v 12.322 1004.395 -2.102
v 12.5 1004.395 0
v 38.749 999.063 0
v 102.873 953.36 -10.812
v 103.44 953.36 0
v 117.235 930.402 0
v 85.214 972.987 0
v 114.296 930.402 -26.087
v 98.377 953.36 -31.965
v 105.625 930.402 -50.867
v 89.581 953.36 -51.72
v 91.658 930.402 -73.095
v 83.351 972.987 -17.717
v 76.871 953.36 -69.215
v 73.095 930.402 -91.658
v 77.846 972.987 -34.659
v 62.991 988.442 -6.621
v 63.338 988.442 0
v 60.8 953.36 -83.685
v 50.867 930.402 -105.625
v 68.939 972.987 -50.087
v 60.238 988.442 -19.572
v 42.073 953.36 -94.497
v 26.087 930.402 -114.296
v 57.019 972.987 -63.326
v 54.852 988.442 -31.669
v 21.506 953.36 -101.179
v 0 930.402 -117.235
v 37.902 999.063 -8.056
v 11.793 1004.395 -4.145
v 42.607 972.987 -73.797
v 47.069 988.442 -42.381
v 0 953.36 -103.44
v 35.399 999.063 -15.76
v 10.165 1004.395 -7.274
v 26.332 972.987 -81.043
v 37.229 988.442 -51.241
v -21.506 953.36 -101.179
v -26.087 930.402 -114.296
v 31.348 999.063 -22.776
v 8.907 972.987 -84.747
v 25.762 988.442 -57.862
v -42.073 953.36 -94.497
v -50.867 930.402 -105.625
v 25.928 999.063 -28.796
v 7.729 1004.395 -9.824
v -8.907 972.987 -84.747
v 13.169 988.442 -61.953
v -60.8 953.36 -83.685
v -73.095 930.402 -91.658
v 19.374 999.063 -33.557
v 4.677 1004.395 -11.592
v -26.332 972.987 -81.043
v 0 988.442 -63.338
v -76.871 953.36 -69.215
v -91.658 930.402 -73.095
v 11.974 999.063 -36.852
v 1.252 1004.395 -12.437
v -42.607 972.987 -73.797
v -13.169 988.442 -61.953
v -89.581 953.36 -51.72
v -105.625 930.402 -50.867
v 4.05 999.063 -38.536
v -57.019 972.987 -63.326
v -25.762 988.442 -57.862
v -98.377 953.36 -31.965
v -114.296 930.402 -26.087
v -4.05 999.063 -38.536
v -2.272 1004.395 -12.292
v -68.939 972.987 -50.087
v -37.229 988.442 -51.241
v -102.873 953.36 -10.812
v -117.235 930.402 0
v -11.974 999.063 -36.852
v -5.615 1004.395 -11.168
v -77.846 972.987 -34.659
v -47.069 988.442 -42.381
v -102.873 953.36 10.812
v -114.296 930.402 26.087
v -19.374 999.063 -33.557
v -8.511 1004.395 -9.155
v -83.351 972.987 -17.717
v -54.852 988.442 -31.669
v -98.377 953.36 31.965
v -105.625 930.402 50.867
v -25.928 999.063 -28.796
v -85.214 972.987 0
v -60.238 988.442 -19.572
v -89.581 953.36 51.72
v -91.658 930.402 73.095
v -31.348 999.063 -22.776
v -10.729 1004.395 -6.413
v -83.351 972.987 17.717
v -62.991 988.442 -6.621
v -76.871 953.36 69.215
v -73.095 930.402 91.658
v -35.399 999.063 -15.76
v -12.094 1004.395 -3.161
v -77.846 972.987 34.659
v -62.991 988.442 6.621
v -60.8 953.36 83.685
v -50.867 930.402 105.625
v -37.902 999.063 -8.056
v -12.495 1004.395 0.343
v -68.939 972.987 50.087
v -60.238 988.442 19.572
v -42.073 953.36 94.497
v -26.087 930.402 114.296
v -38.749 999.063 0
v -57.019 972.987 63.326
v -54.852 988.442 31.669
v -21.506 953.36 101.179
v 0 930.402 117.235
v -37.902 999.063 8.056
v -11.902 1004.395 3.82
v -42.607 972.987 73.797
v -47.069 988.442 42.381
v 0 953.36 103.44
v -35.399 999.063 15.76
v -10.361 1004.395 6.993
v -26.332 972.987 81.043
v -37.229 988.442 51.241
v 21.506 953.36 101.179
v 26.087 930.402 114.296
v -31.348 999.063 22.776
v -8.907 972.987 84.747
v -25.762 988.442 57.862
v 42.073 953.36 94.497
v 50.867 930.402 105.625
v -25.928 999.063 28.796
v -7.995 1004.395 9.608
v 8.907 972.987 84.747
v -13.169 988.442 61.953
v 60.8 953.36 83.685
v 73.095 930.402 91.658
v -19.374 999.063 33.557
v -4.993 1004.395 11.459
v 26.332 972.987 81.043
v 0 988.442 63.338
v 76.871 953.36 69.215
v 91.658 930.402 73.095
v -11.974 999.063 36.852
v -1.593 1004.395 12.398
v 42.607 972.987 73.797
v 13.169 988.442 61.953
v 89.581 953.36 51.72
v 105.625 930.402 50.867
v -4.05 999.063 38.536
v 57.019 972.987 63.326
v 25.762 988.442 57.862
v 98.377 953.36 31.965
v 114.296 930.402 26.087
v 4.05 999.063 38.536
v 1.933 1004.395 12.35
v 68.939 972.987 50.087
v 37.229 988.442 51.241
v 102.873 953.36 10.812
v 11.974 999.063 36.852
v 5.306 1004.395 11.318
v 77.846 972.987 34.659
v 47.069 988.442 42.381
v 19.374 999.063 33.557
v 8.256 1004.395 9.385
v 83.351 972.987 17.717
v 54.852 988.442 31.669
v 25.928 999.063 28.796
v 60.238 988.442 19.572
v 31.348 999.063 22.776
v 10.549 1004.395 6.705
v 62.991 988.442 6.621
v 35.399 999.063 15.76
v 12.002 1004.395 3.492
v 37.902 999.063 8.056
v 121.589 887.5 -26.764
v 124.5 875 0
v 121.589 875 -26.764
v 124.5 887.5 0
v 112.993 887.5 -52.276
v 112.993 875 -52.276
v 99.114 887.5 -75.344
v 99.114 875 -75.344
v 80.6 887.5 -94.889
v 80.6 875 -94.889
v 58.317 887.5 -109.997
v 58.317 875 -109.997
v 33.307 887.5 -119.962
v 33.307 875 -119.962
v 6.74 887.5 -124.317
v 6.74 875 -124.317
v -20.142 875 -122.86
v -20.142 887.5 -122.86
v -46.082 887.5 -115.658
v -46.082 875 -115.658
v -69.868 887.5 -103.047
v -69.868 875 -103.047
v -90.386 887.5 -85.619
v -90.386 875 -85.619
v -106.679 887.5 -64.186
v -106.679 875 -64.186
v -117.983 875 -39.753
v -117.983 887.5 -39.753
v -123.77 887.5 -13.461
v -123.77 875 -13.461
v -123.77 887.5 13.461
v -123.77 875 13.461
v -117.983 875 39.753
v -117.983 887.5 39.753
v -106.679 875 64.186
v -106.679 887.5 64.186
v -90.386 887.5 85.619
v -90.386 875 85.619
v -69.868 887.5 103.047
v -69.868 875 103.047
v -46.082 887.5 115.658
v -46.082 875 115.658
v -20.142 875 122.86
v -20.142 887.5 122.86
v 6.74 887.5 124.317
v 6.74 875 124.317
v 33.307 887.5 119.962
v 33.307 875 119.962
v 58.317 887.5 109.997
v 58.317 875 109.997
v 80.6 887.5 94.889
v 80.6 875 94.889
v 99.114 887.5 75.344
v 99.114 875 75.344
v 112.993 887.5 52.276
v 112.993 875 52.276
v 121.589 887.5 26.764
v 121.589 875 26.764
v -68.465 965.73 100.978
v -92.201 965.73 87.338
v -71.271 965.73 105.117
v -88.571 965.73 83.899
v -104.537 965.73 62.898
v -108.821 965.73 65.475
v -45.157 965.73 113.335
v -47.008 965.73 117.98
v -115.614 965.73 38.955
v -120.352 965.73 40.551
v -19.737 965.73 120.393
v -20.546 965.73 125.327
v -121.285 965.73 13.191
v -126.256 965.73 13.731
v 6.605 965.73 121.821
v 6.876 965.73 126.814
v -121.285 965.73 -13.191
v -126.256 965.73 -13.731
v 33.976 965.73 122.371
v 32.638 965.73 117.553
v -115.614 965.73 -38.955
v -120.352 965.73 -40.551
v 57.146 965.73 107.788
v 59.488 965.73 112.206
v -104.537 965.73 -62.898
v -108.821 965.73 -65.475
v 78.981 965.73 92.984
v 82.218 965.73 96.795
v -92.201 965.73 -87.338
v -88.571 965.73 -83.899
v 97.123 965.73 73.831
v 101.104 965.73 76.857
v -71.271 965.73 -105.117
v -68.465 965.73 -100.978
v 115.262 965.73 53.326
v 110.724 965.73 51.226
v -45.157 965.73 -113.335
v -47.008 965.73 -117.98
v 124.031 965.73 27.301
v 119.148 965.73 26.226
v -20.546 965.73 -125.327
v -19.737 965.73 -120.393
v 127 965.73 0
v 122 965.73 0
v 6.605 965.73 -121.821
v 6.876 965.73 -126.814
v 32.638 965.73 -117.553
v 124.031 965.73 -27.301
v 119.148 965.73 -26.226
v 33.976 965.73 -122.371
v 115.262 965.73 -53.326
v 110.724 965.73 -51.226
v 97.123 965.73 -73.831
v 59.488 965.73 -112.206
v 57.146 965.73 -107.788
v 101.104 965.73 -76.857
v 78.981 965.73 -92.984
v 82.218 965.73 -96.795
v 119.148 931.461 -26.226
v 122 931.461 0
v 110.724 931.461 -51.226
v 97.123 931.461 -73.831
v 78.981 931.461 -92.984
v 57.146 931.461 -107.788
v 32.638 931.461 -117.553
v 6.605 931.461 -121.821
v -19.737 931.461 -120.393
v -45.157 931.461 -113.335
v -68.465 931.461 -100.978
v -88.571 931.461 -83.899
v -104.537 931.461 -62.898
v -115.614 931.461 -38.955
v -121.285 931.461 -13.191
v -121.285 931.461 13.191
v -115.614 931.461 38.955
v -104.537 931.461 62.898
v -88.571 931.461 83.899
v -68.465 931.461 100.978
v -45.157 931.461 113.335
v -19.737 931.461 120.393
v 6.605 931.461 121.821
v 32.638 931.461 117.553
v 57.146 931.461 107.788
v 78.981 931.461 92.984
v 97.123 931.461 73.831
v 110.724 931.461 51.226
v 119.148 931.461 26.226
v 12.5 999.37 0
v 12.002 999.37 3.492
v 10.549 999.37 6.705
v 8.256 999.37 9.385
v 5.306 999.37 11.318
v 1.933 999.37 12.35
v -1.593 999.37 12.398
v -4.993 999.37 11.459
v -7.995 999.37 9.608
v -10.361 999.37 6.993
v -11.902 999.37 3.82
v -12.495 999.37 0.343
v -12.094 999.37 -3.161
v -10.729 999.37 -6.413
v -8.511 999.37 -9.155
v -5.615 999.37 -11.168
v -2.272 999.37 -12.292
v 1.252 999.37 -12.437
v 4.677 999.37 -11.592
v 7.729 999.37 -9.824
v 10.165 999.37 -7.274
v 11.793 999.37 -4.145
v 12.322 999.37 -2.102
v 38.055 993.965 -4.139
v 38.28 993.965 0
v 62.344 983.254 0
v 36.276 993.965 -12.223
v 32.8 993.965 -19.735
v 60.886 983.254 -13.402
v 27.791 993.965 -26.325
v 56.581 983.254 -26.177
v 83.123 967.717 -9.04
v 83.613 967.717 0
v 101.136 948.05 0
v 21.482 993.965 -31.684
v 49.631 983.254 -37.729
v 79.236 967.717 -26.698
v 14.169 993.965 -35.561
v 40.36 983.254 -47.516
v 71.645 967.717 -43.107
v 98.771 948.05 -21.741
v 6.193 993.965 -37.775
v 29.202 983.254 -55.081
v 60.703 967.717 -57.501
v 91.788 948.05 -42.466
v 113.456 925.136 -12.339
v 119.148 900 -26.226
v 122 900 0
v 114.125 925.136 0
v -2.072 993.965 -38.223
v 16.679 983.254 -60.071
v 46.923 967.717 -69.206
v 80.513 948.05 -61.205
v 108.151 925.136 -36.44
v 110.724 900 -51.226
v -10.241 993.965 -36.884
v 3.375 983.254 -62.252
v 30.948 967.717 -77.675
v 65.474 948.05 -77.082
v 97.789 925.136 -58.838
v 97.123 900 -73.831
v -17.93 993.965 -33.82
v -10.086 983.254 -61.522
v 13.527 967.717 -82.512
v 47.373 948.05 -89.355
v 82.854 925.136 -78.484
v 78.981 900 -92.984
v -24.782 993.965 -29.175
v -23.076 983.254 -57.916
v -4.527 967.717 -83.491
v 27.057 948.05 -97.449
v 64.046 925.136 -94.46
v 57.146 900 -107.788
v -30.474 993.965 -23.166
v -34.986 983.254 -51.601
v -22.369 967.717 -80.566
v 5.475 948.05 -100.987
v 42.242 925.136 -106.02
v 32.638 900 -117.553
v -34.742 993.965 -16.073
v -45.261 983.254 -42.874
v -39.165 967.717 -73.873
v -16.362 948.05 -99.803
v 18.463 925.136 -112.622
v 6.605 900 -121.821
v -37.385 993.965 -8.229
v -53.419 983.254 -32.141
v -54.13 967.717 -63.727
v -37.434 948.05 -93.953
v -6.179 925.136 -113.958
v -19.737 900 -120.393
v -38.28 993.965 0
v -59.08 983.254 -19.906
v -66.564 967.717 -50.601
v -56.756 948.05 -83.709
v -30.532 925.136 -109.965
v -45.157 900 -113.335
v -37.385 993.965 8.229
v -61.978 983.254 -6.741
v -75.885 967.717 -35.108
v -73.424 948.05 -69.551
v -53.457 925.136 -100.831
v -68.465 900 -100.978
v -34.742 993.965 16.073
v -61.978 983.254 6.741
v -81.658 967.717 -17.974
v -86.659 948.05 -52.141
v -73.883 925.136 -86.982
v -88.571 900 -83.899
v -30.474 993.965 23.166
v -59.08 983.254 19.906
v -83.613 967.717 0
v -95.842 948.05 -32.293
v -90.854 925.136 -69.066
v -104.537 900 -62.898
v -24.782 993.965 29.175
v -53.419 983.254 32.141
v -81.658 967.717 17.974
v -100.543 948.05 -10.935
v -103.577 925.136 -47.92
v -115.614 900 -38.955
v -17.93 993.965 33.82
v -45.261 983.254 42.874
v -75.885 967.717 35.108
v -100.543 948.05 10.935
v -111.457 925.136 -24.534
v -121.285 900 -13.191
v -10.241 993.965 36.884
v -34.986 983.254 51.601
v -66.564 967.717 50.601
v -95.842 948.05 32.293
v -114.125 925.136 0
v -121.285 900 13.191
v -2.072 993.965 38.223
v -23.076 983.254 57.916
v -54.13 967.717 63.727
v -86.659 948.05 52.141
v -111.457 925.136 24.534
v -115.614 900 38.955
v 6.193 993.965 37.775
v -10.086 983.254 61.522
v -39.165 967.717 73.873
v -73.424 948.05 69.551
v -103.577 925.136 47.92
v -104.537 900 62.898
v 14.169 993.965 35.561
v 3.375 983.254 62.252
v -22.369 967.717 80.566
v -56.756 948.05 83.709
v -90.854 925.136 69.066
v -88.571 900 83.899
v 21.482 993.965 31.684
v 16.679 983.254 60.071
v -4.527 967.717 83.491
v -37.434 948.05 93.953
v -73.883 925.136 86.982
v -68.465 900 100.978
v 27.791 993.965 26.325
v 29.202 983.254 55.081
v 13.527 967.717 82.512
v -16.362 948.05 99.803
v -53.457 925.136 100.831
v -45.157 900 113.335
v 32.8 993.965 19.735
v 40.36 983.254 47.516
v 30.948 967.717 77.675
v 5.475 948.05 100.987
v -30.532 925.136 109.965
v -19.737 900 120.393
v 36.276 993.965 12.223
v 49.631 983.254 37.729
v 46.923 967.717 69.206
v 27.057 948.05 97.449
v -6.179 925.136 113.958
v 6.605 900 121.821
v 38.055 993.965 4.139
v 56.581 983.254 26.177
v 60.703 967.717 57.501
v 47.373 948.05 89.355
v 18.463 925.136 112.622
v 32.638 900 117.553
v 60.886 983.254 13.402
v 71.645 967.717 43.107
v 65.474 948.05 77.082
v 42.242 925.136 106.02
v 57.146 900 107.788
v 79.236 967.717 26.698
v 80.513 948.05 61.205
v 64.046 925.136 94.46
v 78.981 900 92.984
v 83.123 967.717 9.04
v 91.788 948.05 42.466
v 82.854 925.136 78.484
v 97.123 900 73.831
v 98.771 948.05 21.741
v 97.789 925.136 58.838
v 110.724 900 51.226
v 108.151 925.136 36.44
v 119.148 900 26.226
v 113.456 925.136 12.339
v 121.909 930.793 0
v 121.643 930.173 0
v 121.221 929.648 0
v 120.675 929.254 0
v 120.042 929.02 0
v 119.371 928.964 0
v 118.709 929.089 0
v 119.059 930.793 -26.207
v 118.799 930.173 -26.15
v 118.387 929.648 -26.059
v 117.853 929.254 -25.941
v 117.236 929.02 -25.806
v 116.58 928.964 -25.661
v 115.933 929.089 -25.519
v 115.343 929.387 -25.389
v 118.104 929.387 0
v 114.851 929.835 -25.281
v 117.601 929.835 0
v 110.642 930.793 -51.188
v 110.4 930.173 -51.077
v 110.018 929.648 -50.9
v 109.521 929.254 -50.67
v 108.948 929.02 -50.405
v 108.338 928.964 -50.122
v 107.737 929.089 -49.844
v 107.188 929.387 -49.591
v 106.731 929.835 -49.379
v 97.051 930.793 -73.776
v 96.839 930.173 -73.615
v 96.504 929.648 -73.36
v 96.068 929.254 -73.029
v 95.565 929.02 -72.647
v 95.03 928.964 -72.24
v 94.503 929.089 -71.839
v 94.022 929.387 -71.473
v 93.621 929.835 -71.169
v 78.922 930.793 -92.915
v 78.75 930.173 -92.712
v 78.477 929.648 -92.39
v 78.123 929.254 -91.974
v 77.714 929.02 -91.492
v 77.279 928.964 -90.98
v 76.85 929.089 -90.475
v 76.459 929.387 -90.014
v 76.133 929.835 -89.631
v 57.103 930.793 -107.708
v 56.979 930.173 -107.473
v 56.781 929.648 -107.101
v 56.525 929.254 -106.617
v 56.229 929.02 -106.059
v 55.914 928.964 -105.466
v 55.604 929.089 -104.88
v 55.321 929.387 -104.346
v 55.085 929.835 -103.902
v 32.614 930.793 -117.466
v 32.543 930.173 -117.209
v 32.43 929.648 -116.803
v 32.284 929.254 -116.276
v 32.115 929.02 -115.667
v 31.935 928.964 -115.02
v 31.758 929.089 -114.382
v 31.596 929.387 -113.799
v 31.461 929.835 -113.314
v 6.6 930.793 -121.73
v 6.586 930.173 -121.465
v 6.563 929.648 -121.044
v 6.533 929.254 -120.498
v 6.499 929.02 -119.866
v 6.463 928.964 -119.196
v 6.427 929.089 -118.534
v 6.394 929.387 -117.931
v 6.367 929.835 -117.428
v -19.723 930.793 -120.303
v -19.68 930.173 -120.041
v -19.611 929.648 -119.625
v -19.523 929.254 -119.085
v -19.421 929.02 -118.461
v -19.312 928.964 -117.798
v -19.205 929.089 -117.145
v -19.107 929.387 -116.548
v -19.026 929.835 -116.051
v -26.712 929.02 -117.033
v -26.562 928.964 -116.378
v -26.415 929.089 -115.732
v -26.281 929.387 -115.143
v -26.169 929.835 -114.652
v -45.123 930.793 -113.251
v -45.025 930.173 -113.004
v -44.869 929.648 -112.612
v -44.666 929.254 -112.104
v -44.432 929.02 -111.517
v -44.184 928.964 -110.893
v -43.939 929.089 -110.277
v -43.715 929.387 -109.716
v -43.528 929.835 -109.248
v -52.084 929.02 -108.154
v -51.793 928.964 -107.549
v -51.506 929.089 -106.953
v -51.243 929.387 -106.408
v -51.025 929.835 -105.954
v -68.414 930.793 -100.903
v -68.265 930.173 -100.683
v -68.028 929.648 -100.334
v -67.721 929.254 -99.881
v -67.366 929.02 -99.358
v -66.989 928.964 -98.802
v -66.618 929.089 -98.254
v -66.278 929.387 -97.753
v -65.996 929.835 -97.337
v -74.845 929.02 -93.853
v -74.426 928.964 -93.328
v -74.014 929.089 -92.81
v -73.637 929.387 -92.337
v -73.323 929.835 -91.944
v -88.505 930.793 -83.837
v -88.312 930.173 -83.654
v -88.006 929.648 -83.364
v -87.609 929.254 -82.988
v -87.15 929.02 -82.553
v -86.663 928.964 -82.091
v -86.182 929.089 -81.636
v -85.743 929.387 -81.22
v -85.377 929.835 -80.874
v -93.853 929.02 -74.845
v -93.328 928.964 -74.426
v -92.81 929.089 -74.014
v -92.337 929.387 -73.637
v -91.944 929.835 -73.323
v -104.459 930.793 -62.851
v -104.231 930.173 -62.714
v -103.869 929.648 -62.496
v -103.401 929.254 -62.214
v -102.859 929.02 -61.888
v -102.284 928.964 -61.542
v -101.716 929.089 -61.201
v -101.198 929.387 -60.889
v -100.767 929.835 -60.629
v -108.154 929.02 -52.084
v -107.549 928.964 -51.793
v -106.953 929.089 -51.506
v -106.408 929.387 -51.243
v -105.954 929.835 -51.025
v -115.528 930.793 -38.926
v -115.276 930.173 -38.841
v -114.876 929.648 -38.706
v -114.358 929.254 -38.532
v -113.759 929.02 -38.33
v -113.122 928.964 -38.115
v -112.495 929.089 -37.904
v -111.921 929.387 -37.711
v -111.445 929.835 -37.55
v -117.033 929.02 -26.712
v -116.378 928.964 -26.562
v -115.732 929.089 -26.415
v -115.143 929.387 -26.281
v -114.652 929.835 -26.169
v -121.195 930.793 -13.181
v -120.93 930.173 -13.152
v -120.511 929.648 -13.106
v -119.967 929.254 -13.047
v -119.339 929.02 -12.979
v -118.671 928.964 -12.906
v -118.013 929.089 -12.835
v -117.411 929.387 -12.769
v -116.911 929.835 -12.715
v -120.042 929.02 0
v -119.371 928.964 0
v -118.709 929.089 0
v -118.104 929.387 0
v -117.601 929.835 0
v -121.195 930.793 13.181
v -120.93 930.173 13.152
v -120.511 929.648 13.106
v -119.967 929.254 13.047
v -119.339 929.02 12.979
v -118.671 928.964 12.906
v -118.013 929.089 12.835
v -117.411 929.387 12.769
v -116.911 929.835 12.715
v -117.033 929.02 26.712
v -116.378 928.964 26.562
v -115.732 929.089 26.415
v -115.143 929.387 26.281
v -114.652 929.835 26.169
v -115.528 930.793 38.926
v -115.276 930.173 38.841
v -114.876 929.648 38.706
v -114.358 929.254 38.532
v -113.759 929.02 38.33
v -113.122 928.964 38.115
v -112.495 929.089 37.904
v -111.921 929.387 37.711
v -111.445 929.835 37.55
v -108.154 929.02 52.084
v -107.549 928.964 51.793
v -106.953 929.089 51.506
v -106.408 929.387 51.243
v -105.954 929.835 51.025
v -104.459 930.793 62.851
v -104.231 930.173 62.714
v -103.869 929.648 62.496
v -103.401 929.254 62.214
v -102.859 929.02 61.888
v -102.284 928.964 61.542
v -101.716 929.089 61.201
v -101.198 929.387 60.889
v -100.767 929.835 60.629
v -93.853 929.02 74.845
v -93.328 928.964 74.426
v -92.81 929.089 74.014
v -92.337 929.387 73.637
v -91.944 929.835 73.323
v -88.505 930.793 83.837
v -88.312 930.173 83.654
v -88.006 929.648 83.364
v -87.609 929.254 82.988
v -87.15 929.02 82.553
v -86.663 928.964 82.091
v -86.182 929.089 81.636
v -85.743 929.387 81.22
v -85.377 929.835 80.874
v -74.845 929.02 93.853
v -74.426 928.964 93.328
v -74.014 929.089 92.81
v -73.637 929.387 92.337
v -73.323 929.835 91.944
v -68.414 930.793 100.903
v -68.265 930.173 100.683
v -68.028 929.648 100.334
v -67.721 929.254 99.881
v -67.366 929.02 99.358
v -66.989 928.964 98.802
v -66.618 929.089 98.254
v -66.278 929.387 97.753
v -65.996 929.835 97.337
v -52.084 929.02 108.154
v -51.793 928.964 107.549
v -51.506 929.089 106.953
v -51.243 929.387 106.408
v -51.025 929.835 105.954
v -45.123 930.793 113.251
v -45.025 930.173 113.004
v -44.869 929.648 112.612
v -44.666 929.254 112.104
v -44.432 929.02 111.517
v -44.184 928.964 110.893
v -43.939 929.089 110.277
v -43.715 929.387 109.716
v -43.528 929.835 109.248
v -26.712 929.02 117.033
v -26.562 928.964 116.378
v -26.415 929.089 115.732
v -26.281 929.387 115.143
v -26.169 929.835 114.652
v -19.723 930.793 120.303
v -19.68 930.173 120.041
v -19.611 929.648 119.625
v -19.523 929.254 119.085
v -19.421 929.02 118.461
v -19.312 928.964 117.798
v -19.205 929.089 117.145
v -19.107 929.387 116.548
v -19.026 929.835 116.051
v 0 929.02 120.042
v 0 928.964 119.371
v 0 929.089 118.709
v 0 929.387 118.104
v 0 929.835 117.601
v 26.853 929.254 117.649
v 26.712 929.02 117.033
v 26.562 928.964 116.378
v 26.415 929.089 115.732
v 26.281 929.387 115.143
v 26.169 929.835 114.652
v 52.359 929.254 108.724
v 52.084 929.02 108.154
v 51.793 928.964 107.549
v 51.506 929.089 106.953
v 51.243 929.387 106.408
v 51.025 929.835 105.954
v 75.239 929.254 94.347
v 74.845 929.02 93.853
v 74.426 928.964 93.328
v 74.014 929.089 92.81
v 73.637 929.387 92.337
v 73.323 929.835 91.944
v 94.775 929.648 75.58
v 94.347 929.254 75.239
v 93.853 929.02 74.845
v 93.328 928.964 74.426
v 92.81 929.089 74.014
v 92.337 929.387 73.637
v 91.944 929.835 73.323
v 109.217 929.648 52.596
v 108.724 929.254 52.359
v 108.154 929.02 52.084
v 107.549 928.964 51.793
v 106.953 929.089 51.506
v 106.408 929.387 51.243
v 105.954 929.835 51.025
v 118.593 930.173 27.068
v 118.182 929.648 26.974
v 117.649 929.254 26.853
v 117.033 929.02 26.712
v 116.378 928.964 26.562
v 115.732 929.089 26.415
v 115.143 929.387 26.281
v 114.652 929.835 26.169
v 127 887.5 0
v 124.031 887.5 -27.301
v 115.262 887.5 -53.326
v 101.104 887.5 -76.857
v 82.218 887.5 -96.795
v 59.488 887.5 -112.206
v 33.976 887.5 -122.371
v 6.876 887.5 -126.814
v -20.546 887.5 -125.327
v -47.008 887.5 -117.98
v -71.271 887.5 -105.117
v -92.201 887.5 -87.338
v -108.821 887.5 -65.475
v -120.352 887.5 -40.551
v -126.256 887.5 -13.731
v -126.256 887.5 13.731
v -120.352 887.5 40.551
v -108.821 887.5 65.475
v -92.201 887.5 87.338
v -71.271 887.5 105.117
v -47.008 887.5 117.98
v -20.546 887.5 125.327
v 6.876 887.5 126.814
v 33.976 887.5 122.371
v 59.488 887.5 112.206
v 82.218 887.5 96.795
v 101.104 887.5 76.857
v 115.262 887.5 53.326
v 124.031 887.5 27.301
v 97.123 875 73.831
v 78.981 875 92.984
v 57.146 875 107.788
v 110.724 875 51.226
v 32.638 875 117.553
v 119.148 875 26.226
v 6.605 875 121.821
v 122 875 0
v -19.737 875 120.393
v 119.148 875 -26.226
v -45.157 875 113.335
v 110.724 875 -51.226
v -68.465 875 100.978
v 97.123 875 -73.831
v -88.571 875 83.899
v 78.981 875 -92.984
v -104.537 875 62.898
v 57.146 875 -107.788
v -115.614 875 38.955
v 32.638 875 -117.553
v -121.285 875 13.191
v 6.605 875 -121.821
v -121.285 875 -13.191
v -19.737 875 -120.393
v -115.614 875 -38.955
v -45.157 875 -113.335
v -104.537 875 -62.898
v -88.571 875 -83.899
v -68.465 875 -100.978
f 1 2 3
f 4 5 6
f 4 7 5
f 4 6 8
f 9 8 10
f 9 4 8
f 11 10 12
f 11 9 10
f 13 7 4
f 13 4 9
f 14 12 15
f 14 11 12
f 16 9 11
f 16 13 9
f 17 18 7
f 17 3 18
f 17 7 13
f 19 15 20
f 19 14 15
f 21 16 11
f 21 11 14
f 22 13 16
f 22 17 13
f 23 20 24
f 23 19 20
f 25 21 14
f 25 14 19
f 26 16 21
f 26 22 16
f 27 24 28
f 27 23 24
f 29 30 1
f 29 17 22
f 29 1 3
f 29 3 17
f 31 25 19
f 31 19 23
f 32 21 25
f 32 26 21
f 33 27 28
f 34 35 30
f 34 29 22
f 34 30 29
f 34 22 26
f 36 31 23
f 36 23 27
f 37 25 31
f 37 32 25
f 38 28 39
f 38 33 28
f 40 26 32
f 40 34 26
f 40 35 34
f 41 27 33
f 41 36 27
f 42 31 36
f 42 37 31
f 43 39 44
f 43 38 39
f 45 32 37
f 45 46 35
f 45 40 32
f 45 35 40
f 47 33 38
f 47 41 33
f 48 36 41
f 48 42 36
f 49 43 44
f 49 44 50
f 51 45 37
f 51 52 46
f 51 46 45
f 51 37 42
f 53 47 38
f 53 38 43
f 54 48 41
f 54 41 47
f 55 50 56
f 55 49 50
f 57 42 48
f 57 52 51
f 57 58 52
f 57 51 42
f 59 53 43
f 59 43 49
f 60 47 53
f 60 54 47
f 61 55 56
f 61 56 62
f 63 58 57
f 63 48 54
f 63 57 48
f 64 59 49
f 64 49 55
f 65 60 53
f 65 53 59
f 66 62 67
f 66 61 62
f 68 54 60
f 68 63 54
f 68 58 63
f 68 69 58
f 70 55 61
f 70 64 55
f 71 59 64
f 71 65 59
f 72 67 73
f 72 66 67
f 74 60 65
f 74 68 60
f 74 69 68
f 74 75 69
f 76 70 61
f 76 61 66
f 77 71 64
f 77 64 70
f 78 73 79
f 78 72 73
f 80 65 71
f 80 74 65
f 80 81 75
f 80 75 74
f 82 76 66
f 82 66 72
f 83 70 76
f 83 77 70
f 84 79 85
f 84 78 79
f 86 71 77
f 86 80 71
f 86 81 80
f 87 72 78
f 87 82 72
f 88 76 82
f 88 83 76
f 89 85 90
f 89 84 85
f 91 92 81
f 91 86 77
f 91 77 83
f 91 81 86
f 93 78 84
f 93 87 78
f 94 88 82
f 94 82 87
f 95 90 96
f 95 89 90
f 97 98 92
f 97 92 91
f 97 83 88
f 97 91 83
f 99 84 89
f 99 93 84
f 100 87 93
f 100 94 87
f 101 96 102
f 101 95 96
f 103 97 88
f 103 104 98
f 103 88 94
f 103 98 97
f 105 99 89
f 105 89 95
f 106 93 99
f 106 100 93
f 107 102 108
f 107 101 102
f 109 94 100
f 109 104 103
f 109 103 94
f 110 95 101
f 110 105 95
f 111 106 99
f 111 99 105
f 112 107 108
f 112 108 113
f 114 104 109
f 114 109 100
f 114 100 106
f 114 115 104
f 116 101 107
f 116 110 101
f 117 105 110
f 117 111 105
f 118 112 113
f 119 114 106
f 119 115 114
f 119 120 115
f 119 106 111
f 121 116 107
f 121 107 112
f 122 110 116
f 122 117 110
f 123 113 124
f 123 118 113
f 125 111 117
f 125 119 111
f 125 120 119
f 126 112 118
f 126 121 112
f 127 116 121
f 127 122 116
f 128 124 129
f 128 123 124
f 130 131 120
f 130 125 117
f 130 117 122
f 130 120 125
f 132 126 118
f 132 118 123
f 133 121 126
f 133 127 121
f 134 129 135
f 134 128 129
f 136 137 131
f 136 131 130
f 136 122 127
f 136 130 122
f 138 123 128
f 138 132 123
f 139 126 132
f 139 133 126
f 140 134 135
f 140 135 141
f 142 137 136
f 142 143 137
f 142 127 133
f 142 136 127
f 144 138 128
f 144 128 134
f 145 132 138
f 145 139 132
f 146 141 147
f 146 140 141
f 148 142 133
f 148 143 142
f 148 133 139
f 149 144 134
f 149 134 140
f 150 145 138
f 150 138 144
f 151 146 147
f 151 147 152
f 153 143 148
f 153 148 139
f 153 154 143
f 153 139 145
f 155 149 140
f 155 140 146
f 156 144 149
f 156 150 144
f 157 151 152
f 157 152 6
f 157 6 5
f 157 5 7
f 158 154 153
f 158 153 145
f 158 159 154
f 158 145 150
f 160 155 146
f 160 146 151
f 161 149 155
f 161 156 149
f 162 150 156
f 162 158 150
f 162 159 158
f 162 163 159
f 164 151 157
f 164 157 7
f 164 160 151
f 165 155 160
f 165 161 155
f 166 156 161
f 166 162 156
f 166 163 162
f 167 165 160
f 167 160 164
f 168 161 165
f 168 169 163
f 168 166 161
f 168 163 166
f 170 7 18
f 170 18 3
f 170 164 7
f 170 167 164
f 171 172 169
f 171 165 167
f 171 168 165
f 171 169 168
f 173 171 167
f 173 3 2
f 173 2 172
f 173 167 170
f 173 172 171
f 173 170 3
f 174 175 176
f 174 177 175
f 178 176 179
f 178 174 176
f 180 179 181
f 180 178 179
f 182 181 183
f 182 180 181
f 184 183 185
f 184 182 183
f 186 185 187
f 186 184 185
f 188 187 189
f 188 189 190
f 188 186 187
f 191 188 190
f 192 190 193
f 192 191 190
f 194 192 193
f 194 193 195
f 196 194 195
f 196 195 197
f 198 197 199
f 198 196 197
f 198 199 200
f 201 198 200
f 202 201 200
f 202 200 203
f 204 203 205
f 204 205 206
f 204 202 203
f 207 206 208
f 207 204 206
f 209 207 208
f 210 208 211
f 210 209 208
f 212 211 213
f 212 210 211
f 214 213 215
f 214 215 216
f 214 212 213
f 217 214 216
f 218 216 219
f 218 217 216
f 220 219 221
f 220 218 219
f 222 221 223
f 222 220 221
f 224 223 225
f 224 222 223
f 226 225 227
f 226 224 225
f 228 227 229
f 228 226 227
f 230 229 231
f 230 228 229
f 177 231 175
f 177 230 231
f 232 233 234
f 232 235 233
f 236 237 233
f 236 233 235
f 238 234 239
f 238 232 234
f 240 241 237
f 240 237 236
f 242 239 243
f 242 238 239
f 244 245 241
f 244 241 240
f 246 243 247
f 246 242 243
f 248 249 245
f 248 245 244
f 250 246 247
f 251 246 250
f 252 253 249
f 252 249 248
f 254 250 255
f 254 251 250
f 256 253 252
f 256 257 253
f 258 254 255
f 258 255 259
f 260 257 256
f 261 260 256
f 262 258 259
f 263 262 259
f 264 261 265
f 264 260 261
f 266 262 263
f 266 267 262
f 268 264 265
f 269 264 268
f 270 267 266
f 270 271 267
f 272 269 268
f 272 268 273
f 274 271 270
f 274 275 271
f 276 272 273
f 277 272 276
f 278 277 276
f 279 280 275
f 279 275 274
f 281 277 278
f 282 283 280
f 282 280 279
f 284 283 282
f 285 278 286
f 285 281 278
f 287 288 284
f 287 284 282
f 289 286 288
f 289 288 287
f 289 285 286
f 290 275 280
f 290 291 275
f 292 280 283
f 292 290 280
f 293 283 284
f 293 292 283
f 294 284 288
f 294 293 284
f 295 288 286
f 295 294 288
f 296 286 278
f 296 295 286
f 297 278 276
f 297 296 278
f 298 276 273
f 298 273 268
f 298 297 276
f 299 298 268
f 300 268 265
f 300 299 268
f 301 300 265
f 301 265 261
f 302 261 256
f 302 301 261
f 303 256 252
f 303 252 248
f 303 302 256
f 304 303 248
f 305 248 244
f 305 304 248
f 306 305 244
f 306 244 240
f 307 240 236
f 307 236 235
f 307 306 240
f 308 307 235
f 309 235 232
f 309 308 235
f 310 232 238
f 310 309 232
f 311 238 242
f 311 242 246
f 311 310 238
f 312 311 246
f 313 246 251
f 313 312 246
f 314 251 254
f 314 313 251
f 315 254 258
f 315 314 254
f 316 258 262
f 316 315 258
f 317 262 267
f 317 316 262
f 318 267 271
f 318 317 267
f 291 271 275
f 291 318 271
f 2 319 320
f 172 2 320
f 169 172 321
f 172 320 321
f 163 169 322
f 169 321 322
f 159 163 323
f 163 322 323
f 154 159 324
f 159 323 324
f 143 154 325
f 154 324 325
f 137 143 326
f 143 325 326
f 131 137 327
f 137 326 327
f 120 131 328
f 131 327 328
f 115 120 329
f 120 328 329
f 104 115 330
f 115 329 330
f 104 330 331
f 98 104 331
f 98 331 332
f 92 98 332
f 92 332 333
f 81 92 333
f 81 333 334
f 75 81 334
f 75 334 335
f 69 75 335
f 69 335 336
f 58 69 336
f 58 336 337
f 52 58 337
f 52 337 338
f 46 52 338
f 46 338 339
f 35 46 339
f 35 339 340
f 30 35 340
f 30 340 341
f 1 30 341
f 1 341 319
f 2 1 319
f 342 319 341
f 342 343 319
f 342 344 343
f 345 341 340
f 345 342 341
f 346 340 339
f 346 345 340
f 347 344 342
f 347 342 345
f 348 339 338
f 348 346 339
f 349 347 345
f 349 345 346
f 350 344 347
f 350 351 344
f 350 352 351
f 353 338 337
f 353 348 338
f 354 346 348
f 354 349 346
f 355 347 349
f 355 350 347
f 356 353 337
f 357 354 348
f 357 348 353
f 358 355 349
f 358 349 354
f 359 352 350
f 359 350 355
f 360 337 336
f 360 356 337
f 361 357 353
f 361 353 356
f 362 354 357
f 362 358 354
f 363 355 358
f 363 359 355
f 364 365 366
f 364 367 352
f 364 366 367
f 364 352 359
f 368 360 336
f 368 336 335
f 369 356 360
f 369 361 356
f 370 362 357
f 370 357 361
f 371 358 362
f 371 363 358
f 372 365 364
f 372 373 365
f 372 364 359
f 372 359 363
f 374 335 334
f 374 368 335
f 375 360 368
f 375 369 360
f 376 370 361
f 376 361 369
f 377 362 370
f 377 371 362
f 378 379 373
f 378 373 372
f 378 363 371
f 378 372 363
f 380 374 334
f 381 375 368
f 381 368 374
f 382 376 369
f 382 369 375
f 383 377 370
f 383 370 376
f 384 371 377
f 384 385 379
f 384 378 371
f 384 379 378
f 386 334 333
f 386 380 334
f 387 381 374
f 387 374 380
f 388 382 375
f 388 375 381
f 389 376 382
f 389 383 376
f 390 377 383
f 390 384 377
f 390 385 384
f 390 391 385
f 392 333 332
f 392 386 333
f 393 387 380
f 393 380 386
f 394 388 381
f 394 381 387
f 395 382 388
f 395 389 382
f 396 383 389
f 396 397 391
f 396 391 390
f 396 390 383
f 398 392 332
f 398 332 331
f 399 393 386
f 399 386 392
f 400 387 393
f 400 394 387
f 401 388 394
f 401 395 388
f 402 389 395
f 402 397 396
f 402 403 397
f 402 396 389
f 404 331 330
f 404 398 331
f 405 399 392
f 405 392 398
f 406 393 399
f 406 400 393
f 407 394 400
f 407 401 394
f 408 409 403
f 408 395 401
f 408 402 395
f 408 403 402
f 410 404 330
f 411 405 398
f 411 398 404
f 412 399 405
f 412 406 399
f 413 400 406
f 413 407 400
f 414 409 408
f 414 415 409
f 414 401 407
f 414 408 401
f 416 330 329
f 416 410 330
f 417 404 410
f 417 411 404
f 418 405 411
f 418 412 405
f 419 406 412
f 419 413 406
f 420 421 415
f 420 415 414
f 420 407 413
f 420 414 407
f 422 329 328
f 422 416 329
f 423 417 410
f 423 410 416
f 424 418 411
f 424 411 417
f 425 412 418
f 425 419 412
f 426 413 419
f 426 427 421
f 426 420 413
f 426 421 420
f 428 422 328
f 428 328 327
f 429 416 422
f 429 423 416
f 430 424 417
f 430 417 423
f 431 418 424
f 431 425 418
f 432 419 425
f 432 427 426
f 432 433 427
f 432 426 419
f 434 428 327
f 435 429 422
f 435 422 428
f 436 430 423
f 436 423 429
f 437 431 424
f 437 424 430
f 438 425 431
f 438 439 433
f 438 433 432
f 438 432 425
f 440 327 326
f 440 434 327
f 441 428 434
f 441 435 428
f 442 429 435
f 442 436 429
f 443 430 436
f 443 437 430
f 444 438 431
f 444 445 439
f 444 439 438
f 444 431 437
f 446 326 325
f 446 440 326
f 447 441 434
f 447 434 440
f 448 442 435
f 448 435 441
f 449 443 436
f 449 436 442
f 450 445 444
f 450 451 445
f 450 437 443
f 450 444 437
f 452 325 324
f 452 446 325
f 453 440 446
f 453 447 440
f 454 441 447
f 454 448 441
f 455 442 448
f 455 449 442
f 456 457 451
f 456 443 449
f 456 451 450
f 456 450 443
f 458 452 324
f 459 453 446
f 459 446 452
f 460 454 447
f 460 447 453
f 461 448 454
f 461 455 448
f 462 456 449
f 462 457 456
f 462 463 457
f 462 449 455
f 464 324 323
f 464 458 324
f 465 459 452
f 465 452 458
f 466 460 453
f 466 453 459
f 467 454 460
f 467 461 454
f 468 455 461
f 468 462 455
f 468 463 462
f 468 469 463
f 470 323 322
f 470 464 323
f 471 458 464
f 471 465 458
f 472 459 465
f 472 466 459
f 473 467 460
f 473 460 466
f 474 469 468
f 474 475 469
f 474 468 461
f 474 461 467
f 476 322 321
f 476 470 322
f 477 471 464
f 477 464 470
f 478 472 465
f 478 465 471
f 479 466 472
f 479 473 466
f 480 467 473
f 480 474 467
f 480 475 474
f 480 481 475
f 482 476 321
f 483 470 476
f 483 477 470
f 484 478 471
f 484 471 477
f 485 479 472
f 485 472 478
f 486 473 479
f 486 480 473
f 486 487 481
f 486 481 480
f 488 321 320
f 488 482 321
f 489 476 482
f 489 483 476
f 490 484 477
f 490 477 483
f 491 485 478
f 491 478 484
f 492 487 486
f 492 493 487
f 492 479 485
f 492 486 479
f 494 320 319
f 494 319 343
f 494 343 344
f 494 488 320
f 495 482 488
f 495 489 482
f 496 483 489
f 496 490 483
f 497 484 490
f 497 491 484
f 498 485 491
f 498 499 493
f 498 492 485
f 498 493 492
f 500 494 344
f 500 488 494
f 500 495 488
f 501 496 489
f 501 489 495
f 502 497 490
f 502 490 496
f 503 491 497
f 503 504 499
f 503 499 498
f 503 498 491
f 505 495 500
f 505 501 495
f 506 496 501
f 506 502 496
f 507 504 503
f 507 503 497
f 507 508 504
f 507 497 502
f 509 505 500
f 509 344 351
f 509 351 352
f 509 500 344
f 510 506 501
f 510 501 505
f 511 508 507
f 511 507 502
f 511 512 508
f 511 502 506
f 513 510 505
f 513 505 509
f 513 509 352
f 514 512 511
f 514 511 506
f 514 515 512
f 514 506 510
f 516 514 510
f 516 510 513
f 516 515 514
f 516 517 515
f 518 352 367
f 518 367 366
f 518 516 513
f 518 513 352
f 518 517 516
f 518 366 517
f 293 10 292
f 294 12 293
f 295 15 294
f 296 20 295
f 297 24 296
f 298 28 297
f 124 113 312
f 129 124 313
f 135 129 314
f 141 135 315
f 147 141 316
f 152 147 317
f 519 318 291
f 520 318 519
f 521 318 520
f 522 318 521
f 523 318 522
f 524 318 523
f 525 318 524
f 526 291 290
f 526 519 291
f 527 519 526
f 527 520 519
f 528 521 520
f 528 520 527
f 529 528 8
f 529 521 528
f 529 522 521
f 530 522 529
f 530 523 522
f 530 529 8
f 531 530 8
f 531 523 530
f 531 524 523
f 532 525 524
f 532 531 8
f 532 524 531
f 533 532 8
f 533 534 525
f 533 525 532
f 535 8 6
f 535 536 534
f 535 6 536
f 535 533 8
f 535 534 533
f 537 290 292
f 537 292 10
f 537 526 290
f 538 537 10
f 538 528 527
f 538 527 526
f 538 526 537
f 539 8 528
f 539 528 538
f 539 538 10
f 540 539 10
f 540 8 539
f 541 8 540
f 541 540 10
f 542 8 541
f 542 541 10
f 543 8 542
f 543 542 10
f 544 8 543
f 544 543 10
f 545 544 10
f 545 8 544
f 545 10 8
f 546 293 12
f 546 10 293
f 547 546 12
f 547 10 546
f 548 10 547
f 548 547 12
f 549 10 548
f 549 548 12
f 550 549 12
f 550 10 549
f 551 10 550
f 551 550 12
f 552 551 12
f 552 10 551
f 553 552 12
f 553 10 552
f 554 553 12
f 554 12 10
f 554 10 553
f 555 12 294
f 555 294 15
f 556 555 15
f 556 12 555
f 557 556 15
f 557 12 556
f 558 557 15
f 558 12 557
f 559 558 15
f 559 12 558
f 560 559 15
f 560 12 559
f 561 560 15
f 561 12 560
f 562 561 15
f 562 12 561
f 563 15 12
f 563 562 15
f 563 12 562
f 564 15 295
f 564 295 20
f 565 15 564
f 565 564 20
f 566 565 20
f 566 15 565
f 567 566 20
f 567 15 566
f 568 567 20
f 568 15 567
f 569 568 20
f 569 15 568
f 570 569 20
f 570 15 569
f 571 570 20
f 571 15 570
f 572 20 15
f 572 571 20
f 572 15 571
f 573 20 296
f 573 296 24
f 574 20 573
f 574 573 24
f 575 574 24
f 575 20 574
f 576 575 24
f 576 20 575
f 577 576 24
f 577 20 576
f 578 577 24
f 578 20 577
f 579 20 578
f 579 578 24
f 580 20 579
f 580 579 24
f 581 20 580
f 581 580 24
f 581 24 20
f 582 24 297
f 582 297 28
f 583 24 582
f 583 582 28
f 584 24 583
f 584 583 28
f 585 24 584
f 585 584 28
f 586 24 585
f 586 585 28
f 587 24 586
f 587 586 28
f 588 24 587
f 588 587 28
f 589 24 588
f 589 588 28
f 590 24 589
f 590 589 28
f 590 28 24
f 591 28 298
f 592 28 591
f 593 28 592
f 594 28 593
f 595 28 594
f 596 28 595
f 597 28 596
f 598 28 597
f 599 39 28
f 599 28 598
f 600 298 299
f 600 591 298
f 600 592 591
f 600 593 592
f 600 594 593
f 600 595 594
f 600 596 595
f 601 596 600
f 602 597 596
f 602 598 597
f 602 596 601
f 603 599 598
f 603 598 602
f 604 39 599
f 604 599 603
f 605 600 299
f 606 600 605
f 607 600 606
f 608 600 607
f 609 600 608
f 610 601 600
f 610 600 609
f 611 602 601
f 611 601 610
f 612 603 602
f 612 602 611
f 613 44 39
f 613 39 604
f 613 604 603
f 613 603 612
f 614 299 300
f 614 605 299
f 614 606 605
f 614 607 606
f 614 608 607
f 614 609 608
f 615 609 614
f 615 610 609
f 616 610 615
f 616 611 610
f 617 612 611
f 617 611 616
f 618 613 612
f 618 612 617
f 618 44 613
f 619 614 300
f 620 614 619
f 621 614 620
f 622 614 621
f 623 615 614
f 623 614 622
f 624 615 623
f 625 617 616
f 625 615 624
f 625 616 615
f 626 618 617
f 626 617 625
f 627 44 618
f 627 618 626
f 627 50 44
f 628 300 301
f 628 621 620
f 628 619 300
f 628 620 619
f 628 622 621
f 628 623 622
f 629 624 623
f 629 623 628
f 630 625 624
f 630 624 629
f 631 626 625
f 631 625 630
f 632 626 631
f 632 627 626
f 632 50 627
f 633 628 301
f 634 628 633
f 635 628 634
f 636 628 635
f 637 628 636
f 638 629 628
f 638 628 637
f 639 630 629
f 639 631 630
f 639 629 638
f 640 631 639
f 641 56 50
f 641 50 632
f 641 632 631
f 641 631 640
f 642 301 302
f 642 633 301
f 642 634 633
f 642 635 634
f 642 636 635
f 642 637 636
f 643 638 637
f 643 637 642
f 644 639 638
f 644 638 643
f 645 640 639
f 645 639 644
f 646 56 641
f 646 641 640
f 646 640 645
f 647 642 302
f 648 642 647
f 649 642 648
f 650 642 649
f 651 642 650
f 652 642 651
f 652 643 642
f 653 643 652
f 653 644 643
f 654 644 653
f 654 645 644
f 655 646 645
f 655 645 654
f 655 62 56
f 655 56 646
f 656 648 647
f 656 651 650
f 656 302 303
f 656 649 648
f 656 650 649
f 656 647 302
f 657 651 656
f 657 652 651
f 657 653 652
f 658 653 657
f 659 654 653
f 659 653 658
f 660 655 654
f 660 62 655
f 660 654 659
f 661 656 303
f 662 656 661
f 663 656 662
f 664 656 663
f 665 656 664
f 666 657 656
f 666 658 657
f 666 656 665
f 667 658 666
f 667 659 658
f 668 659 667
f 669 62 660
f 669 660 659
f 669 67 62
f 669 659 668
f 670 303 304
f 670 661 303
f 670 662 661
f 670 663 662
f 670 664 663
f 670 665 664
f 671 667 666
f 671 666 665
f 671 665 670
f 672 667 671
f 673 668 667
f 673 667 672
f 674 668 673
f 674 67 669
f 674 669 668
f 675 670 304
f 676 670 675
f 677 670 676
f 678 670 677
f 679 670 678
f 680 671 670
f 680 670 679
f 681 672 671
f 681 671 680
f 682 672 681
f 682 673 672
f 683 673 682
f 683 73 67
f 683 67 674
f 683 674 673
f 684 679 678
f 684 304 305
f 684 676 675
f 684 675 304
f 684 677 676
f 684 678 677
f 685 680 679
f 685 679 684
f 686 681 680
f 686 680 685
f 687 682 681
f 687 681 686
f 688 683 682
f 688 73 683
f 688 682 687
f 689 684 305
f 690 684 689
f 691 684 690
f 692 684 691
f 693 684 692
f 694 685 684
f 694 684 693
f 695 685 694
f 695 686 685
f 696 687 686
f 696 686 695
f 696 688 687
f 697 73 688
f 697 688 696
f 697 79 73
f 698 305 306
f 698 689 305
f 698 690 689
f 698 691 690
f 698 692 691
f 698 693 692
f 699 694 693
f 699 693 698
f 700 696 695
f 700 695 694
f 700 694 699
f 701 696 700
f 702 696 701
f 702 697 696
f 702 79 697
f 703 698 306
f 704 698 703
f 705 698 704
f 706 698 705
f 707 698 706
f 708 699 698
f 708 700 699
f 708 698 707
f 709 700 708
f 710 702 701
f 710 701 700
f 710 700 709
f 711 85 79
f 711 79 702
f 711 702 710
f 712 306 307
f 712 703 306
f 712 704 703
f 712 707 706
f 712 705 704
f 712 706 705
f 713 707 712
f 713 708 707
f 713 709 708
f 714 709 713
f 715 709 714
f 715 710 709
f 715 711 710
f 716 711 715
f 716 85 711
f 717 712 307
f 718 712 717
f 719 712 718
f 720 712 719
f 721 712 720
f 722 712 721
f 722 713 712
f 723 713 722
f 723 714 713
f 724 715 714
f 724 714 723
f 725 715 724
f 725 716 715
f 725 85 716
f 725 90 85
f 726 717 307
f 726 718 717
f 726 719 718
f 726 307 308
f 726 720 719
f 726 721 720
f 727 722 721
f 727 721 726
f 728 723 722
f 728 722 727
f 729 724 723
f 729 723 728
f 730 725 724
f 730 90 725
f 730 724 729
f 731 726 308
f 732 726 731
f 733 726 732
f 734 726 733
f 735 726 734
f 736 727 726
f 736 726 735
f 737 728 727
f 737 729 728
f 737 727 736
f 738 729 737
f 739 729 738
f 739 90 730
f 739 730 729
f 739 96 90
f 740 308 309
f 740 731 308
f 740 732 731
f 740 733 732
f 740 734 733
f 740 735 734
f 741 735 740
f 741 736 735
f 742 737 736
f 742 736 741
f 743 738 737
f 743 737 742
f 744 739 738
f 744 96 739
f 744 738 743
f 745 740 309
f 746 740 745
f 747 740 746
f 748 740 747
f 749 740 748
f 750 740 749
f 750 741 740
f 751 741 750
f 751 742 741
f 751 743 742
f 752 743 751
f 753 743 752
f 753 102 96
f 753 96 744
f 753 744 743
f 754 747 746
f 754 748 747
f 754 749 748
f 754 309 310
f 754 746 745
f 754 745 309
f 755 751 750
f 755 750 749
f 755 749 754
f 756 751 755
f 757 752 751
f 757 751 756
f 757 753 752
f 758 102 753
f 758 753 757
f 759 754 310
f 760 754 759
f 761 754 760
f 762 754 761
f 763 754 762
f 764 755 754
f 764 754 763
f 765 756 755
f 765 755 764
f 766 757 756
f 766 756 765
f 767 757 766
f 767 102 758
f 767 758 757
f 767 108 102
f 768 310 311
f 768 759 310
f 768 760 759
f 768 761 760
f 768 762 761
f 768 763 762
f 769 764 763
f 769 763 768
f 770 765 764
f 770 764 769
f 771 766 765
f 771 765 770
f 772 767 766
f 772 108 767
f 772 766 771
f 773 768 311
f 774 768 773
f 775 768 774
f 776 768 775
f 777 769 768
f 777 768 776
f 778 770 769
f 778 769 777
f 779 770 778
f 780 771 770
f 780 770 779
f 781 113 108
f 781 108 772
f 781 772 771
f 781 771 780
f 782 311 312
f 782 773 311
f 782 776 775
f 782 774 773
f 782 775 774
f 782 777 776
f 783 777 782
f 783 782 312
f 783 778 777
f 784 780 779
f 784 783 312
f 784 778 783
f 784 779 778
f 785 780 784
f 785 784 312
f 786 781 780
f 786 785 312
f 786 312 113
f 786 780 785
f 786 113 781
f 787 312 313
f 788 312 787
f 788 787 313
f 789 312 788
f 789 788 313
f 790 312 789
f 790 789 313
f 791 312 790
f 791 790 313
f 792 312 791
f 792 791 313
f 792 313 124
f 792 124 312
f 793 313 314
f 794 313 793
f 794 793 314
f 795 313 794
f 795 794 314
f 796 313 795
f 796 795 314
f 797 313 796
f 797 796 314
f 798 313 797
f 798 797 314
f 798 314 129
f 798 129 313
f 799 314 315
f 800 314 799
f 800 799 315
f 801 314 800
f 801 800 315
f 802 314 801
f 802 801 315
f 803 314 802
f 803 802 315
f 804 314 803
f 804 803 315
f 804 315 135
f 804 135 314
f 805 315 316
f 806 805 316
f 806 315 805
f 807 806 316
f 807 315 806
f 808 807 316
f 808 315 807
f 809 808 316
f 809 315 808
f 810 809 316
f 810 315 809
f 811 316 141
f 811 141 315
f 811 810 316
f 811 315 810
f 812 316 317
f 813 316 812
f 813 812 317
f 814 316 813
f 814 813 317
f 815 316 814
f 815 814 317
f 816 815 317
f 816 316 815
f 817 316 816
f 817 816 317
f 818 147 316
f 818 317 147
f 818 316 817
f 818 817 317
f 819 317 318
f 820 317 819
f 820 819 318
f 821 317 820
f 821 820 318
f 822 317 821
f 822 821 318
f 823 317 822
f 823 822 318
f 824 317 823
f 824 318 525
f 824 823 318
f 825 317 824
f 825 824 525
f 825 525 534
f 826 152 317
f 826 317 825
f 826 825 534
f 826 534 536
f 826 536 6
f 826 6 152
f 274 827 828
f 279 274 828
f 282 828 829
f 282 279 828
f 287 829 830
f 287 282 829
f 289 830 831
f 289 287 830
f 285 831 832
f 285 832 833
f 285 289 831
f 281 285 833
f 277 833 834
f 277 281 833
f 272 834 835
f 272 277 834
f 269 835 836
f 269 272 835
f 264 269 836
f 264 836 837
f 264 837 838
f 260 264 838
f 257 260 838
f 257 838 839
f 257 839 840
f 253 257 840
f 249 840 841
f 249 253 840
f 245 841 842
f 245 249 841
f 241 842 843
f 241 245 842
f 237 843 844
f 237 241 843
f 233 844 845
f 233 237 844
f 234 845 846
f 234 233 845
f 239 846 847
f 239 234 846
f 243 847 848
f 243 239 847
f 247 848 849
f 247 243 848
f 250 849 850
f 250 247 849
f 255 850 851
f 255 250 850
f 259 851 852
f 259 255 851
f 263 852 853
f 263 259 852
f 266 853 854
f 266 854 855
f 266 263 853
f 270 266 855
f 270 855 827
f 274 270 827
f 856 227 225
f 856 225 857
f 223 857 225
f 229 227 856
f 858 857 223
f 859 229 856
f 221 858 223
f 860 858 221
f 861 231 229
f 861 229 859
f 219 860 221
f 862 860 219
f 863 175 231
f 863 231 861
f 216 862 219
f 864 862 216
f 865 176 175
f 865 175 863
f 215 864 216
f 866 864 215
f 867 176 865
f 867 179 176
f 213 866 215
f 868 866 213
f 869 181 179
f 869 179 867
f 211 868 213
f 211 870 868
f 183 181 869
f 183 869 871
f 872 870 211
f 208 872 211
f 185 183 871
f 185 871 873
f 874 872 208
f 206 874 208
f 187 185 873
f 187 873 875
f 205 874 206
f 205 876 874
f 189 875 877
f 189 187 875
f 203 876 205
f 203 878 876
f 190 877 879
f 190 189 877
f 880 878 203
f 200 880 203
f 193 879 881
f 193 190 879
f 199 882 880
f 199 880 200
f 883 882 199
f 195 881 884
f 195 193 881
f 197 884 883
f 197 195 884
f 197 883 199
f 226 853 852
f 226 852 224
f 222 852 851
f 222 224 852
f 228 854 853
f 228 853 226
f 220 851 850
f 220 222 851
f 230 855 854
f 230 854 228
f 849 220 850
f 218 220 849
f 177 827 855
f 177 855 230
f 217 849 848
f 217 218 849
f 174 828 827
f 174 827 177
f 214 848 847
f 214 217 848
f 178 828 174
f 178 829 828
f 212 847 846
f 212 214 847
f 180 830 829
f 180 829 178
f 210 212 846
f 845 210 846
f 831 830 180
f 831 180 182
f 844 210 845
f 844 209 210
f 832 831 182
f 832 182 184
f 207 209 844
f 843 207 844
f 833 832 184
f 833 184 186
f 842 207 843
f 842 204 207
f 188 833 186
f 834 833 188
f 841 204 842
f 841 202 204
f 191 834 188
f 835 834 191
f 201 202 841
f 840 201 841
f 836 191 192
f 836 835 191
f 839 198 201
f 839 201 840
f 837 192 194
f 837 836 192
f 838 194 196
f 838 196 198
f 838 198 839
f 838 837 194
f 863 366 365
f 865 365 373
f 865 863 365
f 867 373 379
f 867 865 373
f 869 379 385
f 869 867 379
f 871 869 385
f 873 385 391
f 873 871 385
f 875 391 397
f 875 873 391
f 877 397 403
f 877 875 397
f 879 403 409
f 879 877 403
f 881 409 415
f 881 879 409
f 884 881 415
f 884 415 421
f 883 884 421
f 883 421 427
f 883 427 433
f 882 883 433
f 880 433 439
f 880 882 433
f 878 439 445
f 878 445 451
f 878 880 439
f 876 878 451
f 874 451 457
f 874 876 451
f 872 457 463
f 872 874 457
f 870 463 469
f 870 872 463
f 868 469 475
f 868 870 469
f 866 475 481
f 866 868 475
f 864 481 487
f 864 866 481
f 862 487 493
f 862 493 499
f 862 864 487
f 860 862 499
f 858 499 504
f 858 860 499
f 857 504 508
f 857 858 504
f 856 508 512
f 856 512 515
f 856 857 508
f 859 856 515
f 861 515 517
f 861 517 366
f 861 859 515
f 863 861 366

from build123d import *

# Parameters (mm, degrees)
SKETCH3_R          = 12.5
CUT_EXTRUDE1_DEPTH = 1000


with BuildPart() as part:
    # Sketch2 → Revolve1 (revolve)
    with BuildSketch(Plane.XY):
        with BuildLine():
            Line((127, 900), (127, 965.730277379))
            Line((127, 965.730277379), (122, 965.730277379))
            Line((122, 965.730277379), (122, 931.460554757))
            ThreePointArc((122, 931.460554757), (120.042413497, 929.02010652), (117.235369921, 930.401569108))
            ThreePointArc((117.235369921, 930.401569108), (69.478517997, 984.769156682), (0, 1005))
            Line((0, 1005), (0, 1000))
            ThreePointArc((0, 1000), (78.873316147, 971.805445699), (122, 900))
            Line((122, 900), (122, 875))
            Line((122, 875), (124.5, 875))
            Line((124.5, 875), (124.5, 887.5))
            Line((124.5, 887.5), (127, 887.5))
            Line((127, 887.5), (127, 900))
        make_face()
    revolve(axis=Axis((0, 0, 0), (0, 1, 0)))

    # Sketch3 → Cut-Extrude1 (cut)
    with BuildSketch(Plane.XZ.offset(-875)):
        Circle(SKETCH3_R)
    extrude(amount=-CUT_EXTRUDE1_DEPTH, mode=Mode.SUBTRACT)


solid = part.part
